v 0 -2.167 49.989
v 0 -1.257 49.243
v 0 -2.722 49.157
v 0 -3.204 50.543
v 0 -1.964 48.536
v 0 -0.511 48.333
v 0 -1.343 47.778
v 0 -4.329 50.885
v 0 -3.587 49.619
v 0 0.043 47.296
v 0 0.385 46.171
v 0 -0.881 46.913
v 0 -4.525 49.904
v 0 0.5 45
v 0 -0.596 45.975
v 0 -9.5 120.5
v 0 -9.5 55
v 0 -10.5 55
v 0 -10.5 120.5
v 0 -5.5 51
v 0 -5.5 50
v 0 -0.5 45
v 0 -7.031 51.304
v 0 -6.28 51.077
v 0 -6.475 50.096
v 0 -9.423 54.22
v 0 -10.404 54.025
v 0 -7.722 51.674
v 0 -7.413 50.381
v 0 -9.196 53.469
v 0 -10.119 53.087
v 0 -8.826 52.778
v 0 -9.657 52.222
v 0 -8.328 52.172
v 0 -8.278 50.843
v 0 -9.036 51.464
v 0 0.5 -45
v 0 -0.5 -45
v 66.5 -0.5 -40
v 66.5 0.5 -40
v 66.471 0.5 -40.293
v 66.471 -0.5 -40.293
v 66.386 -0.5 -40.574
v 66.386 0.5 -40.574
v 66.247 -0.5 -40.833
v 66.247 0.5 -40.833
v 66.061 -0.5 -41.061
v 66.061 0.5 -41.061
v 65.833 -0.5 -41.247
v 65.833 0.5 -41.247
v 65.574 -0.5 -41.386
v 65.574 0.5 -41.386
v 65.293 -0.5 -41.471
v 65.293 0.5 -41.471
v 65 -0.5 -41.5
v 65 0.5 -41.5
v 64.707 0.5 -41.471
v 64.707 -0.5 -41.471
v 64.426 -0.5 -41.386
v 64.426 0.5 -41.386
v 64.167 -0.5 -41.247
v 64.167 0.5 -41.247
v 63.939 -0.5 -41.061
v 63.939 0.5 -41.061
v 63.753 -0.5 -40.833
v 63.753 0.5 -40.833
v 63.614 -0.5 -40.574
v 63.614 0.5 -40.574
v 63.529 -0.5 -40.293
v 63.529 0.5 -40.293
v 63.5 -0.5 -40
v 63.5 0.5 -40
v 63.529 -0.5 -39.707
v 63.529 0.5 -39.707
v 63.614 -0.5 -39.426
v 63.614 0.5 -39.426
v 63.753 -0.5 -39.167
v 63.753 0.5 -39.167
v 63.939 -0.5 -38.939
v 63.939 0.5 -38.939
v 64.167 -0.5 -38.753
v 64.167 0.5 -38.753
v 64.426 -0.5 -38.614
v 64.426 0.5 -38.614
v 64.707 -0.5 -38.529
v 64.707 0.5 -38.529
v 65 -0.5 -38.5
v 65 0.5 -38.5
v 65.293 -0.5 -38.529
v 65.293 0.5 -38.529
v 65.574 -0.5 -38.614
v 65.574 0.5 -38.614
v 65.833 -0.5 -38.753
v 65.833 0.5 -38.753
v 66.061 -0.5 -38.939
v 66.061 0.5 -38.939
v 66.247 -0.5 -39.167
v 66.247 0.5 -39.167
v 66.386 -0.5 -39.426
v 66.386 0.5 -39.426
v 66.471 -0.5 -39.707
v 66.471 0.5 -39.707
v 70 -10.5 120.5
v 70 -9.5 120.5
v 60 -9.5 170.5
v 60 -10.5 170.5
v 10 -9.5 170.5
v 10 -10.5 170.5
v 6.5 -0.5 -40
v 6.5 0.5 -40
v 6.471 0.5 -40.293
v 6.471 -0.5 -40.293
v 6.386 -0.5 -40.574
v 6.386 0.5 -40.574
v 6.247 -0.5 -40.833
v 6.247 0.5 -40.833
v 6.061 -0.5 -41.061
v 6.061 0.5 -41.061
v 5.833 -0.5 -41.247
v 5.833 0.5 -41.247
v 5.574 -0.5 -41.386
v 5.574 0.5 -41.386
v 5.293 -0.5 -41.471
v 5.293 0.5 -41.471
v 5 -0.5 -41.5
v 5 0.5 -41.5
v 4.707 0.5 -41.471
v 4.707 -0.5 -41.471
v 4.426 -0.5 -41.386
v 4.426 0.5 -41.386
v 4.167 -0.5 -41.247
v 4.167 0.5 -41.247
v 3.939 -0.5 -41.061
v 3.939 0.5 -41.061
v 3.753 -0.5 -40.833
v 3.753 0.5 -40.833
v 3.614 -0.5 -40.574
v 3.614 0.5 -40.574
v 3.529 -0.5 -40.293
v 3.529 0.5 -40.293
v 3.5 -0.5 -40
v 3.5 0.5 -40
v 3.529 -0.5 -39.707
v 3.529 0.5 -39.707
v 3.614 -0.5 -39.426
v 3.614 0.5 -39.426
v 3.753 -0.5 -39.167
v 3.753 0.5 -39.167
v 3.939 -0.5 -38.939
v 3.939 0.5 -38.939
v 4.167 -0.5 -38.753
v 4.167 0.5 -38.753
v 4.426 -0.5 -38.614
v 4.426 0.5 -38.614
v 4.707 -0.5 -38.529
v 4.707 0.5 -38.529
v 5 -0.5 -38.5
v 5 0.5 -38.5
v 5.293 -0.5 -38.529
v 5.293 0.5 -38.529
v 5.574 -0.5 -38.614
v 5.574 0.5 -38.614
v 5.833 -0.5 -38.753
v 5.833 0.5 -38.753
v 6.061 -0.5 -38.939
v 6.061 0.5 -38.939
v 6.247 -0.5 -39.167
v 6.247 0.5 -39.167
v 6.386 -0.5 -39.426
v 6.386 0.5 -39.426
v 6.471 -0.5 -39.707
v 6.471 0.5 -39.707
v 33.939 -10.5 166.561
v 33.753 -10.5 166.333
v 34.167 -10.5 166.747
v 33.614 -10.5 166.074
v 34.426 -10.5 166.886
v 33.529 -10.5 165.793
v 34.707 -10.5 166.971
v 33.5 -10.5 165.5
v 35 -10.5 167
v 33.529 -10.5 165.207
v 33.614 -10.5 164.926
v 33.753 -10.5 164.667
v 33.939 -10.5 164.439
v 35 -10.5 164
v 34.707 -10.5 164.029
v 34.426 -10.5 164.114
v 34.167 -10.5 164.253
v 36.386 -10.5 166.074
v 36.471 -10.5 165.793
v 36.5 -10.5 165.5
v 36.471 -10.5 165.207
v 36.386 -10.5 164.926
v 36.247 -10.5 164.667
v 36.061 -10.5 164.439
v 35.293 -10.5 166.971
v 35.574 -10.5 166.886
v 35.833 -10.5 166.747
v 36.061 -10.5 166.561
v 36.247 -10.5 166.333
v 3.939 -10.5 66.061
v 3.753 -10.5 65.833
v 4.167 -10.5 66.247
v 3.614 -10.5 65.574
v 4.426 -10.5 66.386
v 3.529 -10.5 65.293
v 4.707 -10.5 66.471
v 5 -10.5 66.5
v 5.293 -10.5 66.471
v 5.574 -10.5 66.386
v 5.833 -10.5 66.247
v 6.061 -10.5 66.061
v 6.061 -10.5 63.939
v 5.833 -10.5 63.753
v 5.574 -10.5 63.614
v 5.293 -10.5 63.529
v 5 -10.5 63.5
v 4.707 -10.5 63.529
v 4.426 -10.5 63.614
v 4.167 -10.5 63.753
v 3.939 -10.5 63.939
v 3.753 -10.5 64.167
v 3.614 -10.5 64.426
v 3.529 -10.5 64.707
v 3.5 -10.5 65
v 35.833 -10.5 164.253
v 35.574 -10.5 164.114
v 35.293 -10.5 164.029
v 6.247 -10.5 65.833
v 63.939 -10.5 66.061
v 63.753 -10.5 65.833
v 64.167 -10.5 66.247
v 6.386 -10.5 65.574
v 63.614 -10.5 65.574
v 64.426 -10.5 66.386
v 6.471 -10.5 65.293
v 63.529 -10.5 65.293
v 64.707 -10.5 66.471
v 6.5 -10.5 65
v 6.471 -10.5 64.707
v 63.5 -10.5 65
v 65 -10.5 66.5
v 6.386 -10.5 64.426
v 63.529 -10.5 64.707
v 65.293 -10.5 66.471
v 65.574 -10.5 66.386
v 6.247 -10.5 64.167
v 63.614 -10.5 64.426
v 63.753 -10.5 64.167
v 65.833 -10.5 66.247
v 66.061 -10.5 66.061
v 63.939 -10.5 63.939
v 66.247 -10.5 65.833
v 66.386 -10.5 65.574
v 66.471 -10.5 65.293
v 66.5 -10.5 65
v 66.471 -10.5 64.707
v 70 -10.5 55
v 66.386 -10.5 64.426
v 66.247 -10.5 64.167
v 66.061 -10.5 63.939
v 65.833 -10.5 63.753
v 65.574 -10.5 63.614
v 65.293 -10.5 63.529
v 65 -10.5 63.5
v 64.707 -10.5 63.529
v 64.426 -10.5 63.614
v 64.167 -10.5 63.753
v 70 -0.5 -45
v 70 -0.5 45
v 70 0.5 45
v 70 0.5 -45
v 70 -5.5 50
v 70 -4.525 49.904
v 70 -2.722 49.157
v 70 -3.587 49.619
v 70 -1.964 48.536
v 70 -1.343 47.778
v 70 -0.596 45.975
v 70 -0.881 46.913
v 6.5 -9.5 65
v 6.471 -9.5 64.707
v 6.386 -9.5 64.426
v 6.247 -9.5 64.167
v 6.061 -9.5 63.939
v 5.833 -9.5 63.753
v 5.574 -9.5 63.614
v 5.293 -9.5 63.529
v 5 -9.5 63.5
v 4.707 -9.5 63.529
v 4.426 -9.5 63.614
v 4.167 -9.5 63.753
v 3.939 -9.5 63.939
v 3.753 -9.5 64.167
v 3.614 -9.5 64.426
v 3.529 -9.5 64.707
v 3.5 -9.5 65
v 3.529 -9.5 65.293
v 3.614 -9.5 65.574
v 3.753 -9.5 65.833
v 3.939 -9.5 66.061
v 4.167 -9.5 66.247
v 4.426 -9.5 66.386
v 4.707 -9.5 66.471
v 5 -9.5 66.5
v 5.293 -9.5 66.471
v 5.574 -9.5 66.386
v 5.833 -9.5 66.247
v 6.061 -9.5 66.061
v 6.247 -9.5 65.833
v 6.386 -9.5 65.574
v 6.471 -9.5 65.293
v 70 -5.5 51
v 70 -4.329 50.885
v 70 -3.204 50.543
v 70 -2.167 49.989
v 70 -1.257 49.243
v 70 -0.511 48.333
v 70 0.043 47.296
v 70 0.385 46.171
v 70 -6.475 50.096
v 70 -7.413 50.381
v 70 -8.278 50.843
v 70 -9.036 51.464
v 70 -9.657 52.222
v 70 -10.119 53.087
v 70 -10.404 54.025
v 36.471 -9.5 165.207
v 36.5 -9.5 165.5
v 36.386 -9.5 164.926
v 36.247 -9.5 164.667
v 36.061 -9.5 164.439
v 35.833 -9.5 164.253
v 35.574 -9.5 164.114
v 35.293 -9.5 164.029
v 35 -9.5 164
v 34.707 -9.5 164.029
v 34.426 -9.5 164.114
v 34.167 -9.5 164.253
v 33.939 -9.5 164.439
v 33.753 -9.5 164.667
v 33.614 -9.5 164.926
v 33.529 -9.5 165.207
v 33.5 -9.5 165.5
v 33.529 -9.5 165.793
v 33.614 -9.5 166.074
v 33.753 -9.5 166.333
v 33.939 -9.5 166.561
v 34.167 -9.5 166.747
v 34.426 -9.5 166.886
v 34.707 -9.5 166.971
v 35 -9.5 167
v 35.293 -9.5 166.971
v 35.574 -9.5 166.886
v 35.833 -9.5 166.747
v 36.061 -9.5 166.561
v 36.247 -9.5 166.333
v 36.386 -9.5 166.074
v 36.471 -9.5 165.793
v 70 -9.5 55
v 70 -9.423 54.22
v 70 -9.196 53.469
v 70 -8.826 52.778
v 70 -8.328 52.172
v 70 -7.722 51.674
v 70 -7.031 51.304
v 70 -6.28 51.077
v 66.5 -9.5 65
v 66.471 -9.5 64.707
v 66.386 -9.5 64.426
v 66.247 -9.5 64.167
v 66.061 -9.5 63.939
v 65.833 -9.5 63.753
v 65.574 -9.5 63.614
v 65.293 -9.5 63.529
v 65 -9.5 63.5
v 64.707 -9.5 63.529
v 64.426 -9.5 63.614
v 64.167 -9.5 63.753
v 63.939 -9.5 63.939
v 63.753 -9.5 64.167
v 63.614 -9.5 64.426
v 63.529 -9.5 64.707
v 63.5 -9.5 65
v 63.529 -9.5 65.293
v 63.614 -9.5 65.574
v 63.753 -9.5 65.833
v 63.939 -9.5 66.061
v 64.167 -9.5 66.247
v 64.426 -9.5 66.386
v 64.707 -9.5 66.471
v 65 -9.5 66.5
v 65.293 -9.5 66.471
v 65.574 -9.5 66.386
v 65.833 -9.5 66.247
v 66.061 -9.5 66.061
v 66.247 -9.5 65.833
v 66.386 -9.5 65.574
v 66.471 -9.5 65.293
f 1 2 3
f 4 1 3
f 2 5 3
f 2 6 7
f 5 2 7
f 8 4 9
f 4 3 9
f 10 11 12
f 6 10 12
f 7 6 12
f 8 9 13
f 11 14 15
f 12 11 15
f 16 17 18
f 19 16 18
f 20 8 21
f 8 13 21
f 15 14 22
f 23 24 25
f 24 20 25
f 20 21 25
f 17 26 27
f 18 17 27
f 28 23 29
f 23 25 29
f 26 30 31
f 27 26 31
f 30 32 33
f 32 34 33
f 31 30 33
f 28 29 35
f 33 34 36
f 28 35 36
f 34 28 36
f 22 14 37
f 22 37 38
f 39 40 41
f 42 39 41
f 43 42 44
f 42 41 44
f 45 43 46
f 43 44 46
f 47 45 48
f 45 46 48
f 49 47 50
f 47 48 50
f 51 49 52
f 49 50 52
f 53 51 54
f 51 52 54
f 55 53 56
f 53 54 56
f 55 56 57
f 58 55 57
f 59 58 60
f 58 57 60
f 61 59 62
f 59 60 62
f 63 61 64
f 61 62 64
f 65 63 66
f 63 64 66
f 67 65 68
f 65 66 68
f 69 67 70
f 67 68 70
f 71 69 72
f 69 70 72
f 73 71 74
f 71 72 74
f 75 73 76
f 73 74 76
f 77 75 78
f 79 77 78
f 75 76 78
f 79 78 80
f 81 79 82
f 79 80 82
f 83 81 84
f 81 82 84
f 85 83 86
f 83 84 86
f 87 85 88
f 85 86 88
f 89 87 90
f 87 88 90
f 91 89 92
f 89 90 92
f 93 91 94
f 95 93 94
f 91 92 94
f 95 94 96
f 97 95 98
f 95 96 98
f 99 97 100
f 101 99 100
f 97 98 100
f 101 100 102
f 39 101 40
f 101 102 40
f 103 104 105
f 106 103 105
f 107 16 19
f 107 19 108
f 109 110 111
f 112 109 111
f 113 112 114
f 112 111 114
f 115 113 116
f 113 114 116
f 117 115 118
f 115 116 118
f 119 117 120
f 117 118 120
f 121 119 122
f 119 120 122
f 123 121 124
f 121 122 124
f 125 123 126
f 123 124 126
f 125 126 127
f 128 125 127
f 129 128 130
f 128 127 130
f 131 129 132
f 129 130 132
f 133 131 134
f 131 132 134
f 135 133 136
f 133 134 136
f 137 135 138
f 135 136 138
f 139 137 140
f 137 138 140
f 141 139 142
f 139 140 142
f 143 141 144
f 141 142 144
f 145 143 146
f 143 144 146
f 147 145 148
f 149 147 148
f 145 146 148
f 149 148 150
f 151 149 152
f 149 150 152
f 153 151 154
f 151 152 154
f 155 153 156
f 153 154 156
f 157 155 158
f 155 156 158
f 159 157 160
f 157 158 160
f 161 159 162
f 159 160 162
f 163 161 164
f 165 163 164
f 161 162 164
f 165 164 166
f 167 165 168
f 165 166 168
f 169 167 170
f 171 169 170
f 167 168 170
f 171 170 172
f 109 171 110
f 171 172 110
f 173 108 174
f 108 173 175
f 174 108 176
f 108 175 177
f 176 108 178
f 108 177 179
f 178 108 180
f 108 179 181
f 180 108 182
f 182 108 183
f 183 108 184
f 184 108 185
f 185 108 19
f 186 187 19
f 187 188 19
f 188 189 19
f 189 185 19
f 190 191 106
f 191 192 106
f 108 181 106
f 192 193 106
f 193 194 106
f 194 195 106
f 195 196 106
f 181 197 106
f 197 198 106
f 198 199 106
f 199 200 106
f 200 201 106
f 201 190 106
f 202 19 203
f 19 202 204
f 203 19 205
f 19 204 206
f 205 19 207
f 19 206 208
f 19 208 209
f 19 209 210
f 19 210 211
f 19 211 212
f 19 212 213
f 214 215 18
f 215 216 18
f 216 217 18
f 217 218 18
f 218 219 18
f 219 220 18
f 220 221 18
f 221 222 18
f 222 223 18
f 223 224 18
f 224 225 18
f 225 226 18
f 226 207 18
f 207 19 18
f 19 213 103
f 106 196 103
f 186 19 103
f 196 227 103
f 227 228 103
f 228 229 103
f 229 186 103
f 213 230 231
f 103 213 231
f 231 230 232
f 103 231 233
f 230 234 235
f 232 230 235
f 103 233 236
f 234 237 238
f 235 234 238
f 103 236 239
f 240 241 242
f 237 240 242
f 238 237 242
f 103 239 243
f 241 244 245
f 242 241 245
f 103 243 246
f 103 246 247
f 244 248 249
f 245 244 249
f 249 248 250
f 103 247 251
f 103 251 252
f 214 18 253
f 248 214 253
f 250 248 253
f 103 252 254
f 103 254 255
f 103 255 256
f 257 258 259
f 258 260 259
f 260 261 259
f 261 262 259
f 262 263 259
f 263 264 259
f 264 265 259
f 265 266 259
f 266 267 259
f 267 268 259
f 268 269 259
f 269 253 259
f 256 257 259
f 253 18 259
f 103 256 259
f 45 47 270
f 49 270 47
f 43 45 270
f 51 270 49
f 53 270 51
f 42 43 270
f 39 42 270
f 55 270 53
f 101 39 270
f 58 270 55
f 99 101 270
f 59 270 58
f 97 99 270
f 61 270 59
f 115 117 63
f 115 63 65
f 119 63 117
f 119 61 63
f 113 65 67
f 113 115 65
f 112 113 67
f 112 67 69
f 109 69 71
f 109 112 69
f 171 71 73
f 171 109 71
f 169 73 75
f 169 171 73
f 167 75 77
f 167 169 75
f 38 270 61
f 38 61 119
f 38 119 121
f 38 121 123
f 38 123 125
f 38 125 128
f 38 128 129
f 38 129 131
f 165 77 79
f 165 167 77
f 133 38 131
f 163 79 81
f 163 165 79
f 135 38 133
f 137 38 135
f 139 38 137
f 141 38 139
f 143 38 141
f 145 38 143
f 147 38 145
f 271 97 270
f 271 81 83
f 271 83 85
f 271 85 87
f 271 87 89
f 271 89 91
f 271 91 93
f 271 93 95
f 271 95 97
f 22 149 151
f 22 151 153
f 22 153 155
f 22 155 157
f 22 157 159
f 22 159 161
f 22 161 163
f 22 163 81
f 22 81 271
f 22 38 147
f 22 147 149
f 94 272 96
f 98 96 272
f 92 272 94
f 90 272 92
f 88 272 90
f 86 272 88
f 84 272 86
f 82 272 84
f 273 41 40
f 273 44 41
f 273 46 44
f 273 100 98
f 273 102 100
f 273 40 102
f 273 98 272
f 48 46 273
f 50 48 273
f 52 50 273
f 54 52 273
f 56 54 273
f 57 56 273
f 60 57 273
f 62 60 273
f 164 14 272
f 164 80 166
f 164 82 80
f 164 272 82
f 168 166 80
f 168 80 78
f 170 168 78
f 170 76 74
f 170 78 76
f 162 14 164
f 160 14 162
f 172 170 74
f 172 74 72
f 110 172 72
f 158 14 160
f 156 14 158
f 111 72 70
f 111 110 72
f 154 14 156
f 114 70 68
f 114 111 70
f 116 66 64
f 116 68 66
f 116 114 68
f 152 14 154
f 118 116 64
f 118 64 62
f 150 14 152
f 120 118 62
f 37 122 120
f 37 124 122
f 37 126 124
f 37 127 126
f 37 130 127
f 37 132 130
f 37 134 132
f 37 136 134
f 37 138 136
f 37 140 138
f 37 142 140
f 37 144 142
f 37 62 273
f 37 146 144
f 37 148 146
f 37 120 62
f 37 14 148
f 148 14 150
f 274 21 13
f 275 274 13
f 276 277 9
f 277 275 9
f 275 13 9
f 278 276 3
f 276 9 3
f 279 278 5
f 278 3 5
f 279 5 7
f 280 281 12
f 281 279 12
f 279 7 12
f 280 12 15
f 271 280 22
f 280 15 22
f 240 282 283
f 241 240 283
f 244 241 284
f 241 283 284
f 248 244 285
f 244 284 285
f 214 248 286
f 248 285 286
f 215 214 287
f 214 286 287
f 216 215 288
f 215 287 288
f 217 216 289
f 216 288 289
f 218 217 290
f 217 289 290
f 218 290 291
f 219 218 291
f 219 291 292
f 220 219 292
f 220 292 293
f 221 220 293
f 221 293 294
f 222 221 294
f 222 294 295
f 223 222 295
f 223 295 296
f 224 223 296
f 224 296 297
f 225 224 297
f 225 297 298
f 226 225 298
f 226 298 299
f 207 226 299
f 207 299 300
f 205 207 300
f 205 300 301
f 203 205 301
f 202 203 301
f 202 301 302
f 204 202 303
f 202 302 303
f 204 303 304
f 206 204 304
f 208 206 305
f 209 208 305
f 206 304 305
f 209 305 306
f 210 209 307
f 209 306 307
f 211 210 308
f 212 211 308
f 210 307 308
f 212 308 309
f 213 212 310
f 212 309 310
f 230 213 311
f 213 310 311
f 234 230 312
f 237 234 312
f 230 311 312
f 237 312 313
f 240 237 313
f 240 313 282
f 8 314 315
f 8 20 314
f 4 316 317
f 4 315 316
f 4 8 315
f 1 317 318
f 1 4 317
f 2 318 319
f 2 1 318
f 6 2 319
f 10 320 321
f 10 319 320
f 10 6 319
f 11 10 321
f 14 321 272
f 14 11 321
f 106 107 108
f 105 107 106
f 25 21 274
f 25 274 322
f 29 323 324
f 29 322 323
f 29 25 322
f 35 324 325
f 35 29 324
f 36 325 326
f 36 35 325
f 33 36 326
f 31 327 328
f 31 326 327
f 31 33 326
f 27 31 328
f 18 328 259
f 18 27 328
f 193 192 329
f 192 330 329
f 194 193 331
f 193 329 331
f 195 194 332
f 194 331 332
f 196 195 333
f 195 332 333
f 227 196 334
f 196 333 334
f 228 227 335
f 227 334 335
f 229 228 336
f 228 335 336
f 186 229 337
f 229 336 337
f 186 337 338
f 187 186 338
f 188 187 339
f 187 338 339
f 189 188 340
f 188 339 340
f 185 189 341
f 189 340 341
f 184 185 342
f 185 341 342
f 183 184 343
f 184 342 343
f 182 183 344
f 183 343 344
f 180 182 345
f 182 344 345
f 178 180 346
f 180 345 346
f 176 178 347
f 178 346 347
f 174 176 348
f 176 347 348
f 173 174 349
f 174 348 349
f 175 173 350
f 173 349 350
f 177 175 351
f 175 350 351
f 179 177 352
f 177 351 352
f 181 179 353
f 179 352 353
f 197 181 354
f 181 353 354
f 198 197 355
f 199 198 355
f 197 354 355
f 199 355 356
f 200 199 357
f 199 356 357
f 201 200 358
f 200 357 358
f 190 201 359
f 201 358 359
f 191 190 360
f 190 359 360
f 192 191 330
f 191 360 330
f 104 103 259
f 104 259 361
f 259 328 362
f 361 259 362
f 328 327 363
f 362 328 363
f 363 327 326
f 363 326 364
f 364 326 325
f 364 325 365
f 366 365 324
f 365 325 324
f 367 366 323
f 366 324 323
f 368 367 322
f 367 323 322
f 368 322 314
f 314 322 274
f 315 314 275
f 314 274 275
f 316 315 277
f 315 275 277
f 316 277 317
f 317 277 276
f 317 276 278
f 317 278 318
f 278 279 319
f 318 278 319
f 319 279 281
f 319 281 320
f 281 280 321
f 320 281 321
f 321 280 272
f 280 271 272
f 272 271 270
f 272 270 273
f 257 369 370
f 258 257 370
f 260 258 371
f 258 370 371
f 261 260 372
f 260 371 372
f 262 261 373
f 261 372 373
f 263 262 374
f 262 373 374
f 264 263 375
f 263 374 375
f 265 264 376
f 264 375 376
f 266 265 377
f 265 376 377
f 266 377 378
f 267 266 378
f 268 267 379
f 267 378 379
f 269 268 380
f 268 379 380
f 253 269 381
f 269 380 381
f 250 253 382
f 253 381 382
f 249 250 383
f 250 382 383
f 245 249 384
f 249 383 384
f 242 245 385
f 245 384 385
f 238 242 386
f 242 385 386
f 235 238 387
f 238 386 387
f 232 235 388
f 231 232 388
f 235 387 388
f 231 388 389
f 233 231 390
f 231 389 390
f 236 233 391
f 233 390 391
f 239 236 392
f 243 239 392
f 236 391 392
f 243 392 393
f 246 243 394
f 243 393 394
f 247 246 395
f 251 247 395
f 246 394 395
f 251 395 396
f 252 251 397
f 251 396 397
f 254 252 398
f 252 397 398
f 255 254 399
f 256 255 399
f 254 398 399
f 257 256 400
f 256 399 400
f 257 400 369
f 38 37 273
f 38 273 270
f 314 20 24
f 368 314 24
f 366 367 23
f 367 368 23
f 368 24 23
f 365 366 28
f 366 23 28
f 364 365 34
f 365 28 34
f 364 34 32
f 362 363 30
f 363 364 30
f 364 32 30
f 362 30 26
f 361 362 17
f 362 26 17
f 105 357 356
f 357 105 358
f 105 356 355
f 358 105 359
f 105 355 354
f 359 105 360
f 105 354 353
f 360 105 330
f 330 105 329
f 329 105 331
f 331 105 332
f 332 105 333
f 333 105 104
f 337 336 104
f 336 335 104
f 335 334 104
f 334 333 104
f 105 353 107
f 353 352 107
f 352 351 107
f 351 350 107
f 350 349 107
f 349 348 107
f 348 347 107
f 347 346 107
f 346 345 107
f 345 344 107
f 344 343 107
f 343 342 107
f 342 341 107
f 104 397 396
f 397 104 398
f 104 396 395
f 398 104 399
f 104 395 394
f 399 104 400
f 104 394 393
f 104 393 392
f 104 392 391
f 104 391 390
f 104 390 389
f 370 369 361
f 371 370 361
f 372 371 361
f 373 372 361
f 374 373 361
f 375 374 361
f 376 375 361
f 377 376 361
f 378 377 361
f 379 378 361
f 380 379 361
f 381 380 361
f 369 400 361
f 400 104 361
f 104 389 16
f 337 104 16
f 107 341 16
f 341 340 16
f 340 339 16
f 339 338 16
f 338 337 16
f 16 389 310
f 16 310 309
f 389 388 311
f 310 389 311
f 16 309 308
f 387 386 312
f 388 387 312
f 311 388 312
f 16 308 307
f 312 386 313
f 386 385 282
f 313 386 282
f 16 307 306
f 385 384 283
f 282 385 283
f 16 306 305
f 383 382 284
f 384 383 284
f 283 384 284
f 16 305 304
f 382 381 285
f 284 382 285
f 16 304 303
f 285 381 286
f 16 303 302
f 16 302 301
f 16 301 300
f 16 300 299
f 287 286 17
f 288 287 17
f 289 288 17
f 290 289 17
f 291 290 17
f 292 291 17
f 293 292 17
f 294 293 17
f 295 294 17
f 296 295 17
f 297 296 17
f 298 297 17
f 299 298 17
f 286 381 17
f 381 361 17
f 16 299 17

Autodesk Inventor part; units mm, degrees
ref_plane "YZ Plane" through (0, 0, 0) normal (1, 0, 0) x (0, 1, 0)
ref_plane "XZ Plane" through (0, 0, 0) normal (0, 1, 0) x (-1, 0, 0)
ref_plane "XY Plane" through (0, 0, 0) normal (0, 0, 1) x (1, 0, 0)
sketch "Sketch1" plane through (0, 0, 0) normal (1, 0, 0) x (0, 1, 0)
  line L0 (-0.5, 45) -> (0.5, 45)
  line L1 (0.5, 45) -> (0.5, -45)
  line L2 (0.5, -45) -> (-0.5, -45)
  line L3 (-0.5, -45) -> (-0.5, 45)
  line L4 (-0.5, 45) -> (0.5, -45) construction
  line L5 (0.5, 45) -> (-0.5, -45) construction
  line L6 (-0.5, 45) -> (-5.5, 45)
  line L7 (-5.5, 45) -> (-5.5, 50)
  line L8 (-5.5, 50) -> (-10.5, 50)
  line L9 (-10.5, 50) -> (-10.5, 55)
  arc A0 (-0.5, 45) -> (-5.5, 50) centre (-5.5, 45) ccw
  arc A1 (-10.5, 55) -> (-5.5, 50) centre (-5.5, 55) ccw
  line L10 (-5.5, 50) -> (-5.5, 51)
  arc A2 (0.5, 45) -> (-5.5, 51) centre (-5.5, 45) ccw
  line L11 (-10.5, 55) -> (-9.5, 55)
  line L12 (-10.5, 55) -> (-9.5, 55)
  line L13 (-9.5, 55) -> (-9.5, 165)
  line L14 (-9.5, 165) -> (-10.5, 165)
  line L15 (-10.5, 165) -> (-10.5, 55)
  arc A3 (-9.5, 55) -> (-5.5, 51) centre (-5.5, 55) ccw
  point P0 (0, 0)
  dimension "d0" = 1
  dimension "d1" = 90
  dimension "d2" = 5
  dimension "d3" = 5
  dimension "d4" = 5
  dimension "d5" = 5
  dimension "d6" = 5
  dimension "d7" = 5
  dimension "d8" = 1
  dimension "d9" = 6
  dimension "d10" = 1
  dimension "d12" = 1
  dimension "d13" = 110
  dimension "d14" = 4
extrude "Extrusion1" add sketch "Sketch1" along normal blind 70 contours A0 L10 A2 L0 | L0 L1 L2 L3 | A1 L11 A3 L10 | L15 L14 L13 L11
sketch "Sketch2" plane through (0, 0.5, 45) normal (0, 1, 0) x (1, 0, 0)
  circle A0 centre (5, 85) radius 1.5
  circle A1 centre (65, 85) radius 1.5
  line L0 (0, 90) -> (70, 90) projected
  line L1 (70, 90) -> (70, 0) projected
  line L2 (0, 90) -> (0, 0) projected
  point P0 (0, 45)
  dimension "d17" = 3
  dimension "d18" = 3
  dimension "d19" = 5
  dimension "d20" = 5
  dimension "d21" = 5
  dimension "d22" = 5
extrude "Extrusion2" cut sketch "Sketch2" against normal up to next
sketch "Sketch3" plane through (0, -9.5, 165) normal (0, 1, 0) x (1, 0, 0)
  circle A0 centre (5, 100) radius 1.5
  circle A1 centre (65, 100) radius 1.5
  line L0 (0, 110) -> (70, 110) projected
  line L1 (70, 110) -> (70, 0) projected
  line L2 (0, 110) -> (0, 0) projected
  point P0 (0, 165)
  dimension "d25" = 3
  dimension "d26" = 3
  dimension "d27" = 10
  dimension "d28" = 5
  dimension "d29" = 10
  dimension "d30" = 5
extrude "Extrusion3" cut sketch "Sketch3" against normal up to next
sketch "Sketch4" plane through (0, -10.5, 165) normal (0, 0, 1) x (1, 0, 0)
  line L0 (0, 0) -> (70, 0) projected
  line L1 (0, 0) -> (70, 0)
  line L2 (70, 0) -> (70, 1)
  line L3 (70, 1) -> (0, 1)
  line L4 (0, 1) -> (0, 0)
  point P0 (0, 10.5)
extrude "Extrusion4" add sketch "Sketch4" along normal blind 5.5
sketch "Sketch5" plane through (0, -9.5, 55) normal (0, 1, 0) x (1, 0, 0)
  line L0 (70, -115.5) -> (0, -115.5) projected
  line L1 (35, -115.5) -> (35, -110.5)
  circle A0 centre (35, -110.5) radius 1.5
  point P0 (0, 55)
  dimension "d35" = 5
  dimension "d36" = 3
extrude "Extrusion5" cut sketch "Sketch5" against normal up to next
sketch "Sketch6" plane through (0, -9.5, 55) normal (0, 1, 0) x (1, 0, 0)
  line L0 (70, -115.5) -> (0, -115.5) projected
  line L1 (35, -115.5) -> (60, -115.5)
  line L2 (35, -115.5) -> (10, -115.5)
  line L3 (0, -115.5) -> (0, -65.5)
  line L4 (0, 0) -> (0, -115.5) projected
  line L5 (70, -115.5) -> (70, -65.5)
  line L6 (70, 0) -> (70, -115.5) projected
  line L7 (70, -65.5) -> (60, -115.5)
  line L8 (0, -65.5) -> (10, -115.5)
  line L9 (10, -115.5) -> (0, -115.5)
  line L10 (60, -115.5) -> (70, -115.5)
  point P0 (0, 55)
  dimension "d39" = 25
  dimension "d40" = 25
  dimension "d41" = 50
  dimension "d42" = 50
extrude "Extrusion6" cut sketch "Sketch6" against normal up to next
properties part number "cover" material "PET Plastic"
